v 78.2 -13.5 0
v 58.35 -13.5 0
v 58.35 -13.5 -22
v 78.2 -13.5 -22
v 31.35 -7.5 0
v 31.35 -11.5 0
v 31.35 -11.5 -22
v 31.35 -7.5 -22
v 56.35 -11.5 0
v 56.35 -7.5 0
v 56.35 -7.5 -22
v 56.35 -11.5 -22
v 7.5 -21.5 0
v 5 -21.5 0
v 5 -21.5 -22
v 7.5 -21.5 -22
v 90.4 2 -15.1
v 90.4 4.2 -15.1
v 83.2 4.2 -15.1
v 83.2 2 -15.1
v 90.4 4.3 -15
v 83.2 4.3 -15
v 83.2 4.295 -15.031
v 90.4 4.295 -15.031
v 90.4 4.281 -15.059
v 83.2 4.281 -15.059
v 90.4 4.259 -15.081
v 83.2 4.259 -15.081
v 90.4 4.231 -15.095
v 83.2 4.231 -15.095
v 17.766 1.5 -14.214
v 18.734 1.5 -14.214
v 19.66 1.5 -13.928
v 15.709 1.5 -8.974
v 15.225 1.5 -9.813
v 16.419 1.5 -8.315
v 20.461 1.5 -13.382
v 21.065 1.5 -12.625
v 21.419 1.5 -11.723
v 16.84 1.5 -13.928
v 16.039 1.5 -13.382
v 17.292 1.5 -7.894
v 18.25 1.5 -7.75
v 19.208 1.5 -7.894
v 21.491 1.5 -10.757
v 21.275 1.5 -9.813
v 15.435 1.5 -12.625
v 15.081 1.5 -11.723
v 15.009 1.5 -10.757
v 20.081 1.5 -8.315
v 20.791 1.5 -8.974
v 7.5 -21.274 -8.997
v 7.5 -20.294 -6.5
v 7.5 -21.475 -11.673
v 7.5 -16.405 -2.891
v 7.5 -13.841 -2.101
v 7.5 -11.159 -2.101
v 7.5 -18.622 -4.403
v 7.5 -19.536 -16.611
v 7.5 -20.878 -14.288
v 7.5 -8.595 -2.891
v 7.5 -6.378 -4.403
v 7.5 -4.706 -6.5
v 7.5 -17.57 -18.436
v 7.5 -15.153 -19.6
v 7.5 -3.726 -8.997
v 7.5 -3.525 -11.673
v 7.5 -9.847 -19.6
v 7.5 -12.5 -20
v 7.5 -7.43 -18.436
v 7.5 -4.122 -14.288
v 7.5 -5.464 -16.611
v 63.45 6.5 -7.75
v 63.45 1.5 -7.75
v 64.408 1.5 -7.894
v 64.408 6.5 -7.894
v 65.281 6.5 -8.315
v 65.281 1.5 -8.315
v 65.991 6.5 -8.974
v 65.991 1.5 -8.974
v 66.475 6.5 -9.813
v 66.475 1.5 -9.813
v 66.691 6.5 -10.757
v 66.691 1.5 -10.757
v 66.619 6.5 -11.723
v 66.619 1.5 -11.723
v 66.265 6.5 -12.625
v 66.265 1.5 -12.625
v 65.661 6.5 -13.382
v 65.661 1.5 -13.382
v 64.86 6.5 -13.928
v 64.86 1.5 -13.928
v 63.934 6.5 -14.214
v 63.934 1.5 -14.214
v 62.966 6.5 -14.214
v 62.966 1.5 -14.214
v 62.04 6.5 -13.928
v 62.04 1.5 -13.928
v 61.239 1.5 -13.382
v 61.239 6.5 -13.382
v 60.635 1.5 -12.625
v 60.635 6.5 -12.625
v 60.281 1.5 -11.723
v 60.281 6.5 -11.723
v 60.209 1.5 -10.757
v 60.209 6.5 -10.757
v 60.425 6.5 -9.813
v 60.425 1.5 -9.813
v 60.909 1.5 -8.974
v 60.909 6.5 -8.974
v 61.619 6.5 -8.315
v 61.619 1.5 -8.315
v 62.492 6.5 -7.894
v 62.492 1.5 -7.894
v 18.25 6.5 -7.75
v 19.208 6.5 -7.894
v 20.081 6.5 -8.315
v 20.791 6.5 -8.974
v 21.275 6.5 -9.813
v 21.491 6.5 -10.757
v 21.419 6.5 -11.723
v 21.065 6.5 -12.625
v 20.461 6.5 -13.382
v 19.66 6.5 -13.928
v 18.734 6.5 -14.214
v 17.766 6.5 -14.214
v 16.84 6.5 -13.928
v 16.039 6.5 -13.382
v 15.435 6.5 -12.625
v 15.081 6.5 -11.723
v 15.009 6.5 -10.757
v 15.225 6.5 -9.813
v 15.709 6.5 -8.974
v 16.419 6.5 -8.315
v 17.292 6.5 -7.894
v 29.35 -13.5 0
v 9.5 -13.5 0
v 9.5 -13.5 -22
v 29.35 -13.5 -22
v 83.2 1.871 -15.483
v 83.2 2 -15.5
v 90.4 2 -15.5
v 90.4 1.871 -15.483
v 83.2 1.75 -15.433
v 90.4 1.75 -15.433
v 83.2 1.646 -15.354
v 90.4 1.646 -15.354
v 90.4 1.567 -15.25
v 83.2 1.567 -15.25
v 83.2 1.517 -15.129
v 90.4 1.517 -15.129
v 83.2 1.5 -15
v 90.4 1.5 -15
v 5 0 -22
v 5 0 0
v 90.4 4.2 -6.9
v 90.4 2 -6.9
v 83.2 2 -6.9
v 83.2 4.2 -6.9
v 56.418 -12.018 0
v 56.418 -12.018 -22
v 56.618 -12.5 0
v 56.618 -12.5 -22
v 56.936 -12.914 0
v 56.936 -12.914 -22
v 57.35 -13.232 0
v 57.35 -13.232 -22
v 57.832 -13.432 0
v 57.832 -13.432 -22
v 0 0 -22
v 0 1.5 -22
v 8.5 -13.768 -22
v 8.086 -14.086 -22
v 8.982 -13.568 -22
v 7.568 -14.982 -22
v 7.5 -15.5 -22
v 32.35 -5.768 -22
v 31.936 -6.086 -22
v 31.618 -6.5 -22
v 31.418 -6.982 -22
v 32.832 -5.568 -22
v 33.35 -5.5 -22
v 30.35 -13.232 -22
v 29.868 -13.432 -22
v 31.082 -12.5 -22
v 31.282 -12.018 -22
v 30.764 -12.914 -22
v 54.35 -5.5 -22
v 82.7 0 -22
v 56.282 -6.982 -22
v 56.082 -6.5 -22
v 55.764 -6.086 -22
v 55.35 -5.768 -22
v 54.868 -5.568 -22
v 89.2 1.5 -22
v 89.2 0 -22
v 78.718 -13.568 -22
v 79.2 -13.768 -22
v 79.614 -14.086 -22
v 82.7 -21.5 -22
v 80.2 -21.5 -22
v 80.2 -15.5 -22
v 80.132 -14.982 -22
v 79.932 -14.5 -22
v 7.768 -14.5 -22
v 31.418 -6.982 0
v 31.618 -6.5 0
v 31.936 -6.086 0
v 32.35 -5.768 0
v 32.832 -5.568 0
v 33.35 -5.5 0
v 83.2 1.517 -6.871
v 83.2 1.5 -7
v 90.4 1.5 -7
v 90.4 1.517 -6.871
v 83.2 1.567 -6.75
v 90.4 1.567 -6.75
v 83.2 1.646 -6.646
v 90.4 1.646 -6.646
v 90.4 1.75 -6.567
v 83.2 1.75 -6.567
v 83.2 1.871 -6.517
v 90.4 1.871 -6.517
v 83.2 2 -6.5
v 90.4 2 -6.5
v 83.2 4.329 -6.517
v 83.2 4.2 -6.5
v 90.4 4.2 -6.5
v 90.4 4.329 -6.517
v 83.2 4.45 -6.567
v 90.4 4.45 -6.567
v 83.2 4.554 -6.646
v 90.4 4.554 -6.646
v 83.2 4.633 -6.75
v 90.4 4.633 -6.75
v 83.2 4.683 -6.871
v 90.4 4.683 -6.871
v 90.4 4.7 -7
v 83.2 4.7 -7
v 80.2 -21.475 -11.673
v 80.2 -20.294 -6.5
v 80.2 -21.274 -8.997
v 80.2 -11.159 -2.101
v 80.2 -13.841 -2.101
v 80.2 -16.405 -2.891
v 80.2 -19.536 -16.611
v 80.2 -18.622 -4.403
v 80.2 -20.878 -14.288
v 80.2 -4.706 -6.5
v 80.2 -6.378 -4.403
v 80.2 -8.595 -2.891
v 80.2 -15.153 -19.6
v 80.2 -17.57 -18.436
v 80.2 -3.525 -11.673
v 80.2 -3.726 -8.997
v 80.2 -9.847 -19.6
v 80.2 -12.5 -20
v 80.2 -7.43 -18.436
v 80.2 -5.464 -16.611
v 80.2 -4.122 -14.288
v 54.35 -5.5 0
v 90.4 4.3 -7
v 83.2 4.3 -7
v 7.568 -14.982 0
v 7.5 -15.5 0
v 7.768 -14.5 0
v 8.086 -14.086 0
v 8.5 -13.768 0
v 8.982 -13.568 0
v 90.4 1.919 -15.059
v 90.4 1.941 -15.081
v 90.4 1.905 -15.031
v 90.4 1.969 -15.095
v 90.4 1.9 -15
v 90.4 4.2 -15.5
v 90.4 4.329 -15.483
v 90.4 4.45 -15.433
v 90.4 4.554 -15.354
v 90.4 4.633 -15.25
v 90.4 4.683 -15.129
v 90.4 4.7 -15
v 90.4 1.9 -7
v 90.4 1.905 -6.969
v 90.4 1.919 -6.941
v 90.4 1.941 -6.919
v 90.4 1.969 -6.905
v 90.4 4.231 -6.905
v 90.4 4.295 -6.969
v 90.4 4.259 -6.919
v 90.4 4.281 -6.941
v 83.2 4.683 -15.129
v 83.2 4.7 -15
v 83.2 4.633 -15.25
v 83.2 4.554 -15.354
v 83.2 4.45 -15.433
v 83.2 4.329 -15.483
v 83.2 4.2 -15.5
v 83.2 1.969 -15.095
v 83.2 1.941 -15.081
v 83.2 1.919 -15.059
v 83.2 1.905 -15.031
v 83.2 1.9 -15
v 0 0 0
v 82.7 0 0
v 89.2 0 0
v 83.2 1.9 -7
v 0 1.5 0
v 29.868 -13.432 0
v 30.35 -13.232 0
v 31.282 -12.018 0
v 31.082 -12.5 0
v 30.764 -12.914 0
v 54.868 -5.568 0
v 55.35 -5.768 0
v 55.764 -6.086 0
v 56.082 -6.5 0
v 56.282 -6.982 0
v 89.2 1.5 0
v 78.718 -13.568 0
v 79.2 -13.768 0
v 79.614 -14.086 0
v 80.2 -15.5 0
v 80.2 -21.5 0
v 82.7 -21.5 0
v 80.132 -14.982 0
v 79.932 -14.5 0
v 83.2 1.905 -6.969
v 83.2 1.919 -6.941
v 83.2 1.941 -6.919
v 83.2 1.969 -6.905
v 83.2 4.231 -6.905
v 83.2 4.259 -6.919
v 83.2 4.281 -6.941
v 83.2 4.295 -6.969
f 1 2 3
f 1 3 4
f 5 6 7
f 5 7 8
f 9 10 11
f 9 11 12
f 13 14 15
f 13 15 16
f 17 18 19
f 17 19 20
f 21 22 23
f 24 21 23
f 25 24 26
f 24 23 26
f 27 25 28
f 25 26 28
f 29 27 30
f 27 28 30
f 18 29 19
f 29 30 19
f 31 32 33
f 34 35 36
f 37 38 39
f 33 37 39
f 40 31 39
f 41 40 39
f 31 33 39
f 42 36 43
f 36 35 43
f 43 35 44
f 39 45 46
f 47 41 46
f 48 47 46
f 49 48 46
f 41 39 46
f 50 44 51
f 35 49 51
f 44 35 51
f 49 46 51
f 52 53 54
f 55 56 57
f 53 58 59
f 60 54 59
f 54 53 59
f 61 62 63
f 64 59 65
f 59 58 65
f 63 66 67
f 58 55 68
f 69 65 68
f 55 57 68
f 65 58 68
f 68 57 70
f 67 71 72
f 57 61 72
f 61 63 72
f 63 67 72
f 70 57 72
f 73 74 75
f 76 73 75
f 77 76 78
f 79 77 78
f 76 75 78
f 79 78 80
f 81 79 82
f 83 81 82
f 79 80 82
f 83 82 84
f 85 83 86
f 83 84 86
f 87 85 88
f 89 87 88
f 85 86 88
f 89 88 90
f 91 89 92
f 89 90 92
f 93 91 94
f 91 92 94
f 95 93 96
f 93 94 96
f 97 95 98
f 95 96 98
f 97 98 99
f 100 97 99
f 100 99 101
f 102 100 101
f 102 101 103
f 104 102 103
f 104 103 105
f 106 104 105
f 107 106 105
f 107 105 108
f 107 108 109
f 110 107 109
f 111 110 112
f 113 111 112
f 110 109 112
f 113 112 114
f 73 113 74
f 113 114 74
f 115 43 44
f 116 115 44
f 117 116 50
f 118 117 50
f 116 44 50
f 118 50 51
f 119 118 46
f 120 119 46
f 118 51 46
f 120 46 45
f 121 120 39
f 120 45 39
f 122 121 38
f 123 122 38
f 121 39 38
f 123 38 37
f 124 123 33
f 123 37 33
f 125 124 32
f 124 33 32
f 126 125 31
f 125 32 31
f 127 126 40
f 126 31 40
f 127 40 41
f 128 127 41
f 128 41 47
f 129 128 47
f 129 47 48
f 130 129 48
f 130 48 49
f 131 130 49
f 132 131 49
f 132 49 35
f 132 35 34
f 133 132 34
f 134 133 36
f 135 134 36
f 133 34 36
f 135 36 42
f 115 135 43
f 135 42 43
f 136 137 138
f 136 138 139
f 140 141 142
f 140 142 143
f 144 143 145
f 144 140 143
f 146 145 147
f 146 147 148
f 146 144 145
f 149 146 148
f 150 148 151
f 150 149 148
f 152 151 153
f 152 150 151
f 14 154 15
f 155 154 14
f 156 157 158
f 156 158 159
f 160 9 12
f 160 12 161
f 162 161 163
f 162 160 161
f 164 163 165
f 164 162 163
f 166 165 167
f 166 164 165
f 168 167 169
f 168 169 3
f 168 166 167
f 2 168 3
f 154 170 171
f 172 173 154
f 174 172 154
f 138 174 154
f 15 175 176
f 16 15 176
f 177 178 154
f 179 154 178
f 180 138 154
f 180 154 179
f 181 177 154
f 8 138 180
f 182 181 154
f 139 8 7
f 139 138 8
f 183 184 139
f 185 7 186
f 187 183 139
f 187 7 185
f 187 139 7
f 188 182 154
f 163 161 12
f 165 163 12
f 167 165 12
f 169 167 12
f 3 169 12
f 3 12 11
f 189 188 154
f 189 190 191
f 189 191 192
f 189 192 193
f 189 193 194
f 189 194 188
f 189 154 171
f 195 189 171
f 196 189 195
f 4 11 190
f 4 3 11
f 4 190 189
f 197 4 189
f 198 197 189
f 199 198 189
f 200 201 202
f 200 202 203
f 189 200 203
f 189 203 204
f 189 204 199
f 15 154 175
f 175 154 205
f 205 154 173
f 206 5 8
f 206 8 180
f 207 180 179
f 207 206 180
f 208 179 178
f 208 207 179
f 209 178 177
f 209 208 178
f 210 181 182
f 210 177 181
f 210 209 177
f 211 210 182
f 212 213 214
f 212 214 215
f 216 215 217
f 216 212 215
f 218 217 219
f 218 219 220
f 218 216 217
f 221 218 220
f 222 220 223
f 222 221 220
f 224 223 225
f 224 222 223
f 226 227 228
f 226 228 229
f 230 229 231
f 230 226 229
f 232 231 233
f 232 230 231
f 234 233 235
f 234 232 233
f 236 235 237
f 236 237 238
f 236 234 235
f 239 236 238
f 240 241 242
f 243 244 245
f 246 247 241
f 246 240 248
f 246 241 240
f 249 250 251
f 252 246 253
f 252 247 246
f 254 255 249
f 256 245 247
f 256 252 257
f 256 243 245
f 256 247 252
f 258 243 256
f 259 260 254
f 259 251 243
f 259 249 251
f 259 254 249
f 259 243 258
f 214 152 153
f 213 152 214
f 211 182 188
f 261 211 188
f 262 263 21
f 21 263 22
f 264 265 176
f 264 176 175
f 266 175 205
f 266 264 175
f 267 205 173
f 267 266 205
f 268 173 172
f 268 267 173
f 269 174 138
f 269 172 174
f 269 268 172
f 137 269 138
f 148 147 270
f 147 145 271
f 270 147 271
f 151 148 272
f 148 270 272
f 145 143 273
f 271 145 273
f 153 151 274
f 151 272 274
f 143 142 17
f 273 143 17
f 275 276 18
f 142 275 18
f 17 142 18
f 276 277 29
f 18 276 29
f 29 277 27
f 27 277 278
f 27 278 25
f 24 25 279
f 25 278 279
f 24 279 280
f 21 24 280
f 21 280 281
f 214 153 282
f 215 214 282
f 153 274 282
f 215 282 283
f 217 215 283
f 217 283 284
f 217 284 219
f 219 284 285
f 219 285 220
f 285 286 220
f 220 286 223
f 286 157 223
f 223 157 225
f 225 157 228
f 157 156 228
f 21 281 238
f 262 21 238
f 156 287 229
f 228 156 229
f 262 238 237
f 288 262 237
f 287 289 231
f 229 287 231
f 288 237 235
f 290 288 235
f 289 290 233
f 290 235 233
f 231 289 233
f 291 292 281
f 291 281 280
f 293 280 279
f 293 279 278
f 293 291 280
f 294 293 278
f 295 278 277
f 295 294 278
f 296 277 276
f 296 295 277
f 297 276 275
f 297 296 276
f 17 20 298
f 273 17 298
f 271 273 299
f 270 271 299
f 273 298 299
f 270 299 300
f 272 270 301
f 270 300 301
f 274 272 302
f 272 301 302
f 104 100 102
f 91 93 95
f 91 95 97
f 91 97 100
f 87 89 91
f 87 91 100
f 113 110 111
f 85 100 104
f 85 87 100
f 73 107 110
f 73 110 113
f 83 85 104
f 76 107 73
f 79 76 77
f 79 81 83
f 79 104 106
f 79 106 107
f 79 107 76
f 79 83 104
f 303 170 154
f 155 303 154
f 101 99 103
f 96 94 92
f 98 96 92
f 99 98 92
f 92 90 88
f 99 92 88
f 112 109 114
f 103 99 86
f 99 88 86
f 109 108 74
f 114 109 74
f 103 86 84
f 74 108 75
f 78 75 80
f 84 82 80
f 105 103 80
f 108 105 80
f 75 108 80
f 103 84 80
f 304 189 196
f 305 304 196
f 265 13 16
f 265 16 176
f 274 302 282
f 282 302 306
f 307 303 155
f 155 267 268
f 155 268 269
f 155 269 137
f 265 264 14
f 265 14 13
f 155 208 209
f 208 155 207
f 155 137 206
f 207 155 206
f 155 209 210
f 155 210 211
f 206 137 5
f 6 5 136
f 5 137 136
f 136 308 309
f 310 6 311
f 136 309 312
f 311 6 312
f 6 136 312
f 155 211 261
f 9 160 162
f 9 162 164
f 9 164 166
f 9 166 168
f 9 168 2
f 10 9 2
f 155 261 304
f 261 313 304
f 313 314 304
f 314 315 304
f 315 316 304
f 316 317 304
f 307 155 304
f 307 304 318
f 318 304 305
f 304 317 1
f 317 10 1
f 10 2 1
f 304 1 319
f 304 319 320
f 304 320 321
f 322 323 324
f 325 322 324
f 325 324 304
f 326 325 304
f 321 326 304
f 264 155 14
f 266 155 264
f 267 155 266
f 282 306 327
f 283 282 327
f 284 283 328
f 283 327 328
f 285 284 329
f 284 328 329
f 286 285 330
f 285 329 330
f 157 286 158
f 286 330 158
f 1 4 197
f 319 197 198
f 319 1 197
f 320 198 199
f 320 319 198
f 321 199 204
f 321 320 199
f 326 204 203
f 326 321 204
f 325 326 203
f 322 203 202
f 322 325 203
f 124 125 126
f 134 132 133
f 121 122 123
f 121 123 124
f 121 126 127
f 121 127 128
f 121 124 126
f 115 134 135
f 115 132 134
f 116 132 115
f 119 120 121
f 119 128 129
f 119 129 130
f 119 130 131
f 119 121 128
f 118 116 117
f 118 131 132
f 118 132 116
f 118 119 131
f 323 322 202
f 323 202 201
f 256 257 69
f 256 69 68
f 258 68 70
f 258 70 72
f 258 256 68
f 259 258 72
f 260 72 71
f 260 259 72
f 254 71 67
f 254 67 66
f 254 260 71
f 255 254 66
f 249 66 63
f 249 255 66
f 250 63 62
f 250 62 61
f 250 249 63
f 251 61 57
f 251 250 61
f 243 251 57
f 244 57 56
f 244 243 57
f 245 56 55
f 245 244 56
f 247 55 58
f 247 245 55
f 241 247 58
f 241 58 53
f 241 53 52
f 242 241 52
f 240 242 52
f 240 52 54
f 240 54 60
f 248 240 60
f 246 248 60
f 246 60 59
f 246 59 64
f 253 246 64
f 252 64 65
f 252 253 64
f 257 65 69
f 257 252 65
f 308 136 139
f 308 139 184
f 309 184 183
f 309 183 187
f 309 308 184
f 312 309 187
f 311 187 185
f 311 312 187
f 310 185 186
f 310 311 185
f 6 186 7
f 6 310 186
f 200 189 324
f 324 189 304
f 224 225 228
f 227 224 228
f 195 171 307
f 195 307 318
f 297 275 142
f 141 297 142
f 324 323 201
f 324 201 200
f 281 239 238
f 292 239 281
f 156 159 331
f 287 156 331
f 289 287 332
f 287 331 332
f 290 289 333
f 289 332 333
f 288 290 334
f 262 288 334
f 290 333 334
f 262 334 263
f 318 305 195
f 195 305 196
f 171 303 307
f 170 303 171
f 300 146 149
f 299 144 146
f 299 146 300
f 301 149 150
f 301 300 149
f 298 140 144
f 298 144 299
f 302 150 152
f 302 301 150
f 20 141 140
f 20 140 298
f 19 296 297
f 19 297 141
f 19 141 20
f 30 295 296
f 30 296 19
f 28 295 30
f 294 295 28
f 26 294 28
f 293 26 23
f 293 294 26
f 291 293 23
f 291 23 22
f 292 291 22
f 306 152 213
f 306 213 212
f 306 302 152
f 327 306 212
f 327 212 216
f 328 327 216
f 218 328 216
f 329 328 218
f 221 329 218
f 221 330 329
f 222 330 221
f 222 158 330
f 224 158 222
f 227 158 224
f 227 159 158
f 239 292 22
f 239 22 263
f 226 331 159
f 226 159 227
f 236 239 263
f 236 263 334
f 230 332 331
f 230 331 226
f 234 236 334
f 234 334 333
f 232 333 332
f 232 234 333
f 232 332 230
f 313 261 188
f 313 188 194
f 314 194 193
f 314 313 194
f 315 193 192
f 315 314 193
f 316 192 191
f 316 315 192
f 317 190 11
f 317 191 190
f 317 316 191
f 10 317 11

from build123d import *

# Parameters (mm, degrees)
SKETCH1_W                = 89.2
SKETCH1_H                = 22
BOSS_EXTRUDE1_DEPTH      = 1.5
BOSS_EXTRUDE2_DEPTH      = 1.2
BOSS_EXTRUDE2_DEPTH_BACK = 6
SKETCH4_R                = 3.25
BOSS_EXTRUDE3_DEPTH      = 5
BOSS_EXTRUDE3_2_DEPTH    = 5
SKETCH5_W                = 77.7
SKETCH5_H                = 22
BOSS_EXTRUDE4_DEPTH      = 21.5
CUT_EXTRUDE1_DEPTH       = 31.5
SKETCH7_R                = 9
BOSS_EXTRUDE5_DEPTH      = 72.7


with BuildPart() as part:
    # Sketch1 → Boss-Extrude1 (new body)
    with BuildSketch(Plane(origin=(0, 0, 0), x_dir=(1, 0, 0), z_dir=(0, 1, 0))):
        with Locations((44.6, 11)):
            Rectangle(SKETCH1_W, SKETCH1_H)
    extrude(amount=BOSS_EXTRUDE1_DEPTH)

    # Sketch5 → Boss-Extrude4 (add)
    with BuildSketch(Plane.XZ):
        with Locations((43.85, -11)):
            Rectangle(SKETCH5_W, SKETCH5_H)
    extrude(amount=BOSS_EXTRUDE4_DEPTH)

    # Sketch8 → Cut-Extrude1 (cut)
    with BuildSketch(Plane.XY):
        with BuildLine():
            Line((7.5, -21.5), (7.5, -15.5))
            ThreePointArc((7.5, -15.5), (8.085786438, -14.085786438), (9.5, -13.5))
            Line((9.5, -13.5), (29.35, -13.5))
            ThreePointArc((29.35, -13.5), (30.764213562, -12.914213562), (31.35, -11.5))
            Line((31.35, -11.5), (31.35, -7.5))
            ThreePointArc((31.35, -7.5), (31.935786438, -6.085786438), (33.35, -5.5))
            Line((33.35, -5.5), (54.35, -5.5))
            ThreePointArc((54.35, -5.5), (55.764213562, -6.085786438), (56.35, -7.5))
            Line((56.35, -7.5), (56.35, -11.5))
            ThreePointArc((56.35, -11.5), (56.935786438, -12.914213562), (58.35, -13.5))
            Line((58.35, -13.5), (78.2, -13.5))
            ThreePointArc((78.2, -13.5), (79.614213562, -14.085786438), (80.2, -15.5))
            Line((80.2, -15.5), (80.2, -21.5))
            Line((80.2, -21.5), (7.5, -21.5))
        make_face()
    extrude(amount=-CUT_EXTRUDE1_DEPTH, mode=Mode.SUBTRACT)


with BuildPart() as body_2:
    # Sketch3 → Boss-Extrude2 (new, two sides: drawn at the far end of the back side and taken through both)
    with BuildSketch(Plane(origin=(89.2, 0, 0), x_dir=(0, 0, -1), z_dir=(1, 0, 0)).offset(-BOSS_EXTRUDE2_DEPTH_BACK)):
        with BuildLine():
            Line((7, 4.7), (15, 4.7))
            ThreePointArc((15, 4.7), (15.353553391, 4.553553391), (15.5, 4.2))
            Line((15.5, 4.2), (15.5, 2))
            ThreePointArc((15.5, 2), (15.353553391, 1.646446609), (15, 1.5))
            Line((15, 1.5), (7, 1.5))
            ThreePointArc((7, 1.5), (6.646446609, 1.646446609), (6.5, 2))
            Line((6.5, 2), (6.5, 4.2))
            ThreePointArc((6.5, 4.2), (6.646446609, 4.553553391), (7, 4.7))
        make_face()
        with BuildLine():
            Line((7, 4.3), (15, 4.3))
            ThreePointArc((15, 4.3), (15.070710678, 4.270710678), (15.1, 4.2))
            Line((15.1, 4.2), (15.1, 2))
            ThreePointArc((15.1, 2), (15.070710678, 1.929289322), (15, 1.9))
            Line((15, 1.9), (7, 1.9))
            ThreePointArc((7, 1.9), (6.929289322, 1.929289322), (6.9, 2))
            Line((6.9, 2), (6.9, 4.2))
            ThreePointArc((6.9, 4.2), (6.929289322, 4.270710678), (7, 4.3))
        make_face(mode=Mode.SUBTRACT)
    extrude(amount=BOSS_EXTRUDE2_DEPTH + BOSS_EXTRUDE2_DEPTH_BACK)


with BuildPart() as body_3:
    # Sketch4 → Boss-Extrude3 (new body)
    with BuildSketch(Plane(origin=(0, 1.5, 0), x_dir=(1, 0, 0), z_dir=(0, 1, 0))):
        with Locations(Location((18.25, 11, 0), (0, 0, 270))):
            Circle(SKETCH4_R)
    extrude(amount=BOSS_EXTRUDE3_DEPTH)


with BuildPart() as body_4:
    # Sketch4 → Boss-Extrude3 2 (new body)
    with BuildSketch(Plane(origin=(0, 1.5, 0), x_dir=(1, 0, 0), z_dir=(0, 1, 0))):
        with Locations(Location((63.45, 11, 0), (0, 0, 270))):
            Circle(SKETCH4_R)
    extrude(amount=BOSS_EXTRUDE3_2_DEPTH)


with BuildPart() as body_5:
    # Sketch7 → Boss-Extrude5 (new body)
    with BuildSketch(Plane(origin=(80.2, 0, 0), x_dir=(0, 0, -1), z_dir=(1, 0, 0))):
        with Locations((11, -12.5)):
            Circle(SKETCH7_R)
    extrude(amount=-BOSS_EXTRUDE5_DEPTH)


solid = Compound([part.part, body_2.part, body_3.part, body_4.part, body_5.part])
